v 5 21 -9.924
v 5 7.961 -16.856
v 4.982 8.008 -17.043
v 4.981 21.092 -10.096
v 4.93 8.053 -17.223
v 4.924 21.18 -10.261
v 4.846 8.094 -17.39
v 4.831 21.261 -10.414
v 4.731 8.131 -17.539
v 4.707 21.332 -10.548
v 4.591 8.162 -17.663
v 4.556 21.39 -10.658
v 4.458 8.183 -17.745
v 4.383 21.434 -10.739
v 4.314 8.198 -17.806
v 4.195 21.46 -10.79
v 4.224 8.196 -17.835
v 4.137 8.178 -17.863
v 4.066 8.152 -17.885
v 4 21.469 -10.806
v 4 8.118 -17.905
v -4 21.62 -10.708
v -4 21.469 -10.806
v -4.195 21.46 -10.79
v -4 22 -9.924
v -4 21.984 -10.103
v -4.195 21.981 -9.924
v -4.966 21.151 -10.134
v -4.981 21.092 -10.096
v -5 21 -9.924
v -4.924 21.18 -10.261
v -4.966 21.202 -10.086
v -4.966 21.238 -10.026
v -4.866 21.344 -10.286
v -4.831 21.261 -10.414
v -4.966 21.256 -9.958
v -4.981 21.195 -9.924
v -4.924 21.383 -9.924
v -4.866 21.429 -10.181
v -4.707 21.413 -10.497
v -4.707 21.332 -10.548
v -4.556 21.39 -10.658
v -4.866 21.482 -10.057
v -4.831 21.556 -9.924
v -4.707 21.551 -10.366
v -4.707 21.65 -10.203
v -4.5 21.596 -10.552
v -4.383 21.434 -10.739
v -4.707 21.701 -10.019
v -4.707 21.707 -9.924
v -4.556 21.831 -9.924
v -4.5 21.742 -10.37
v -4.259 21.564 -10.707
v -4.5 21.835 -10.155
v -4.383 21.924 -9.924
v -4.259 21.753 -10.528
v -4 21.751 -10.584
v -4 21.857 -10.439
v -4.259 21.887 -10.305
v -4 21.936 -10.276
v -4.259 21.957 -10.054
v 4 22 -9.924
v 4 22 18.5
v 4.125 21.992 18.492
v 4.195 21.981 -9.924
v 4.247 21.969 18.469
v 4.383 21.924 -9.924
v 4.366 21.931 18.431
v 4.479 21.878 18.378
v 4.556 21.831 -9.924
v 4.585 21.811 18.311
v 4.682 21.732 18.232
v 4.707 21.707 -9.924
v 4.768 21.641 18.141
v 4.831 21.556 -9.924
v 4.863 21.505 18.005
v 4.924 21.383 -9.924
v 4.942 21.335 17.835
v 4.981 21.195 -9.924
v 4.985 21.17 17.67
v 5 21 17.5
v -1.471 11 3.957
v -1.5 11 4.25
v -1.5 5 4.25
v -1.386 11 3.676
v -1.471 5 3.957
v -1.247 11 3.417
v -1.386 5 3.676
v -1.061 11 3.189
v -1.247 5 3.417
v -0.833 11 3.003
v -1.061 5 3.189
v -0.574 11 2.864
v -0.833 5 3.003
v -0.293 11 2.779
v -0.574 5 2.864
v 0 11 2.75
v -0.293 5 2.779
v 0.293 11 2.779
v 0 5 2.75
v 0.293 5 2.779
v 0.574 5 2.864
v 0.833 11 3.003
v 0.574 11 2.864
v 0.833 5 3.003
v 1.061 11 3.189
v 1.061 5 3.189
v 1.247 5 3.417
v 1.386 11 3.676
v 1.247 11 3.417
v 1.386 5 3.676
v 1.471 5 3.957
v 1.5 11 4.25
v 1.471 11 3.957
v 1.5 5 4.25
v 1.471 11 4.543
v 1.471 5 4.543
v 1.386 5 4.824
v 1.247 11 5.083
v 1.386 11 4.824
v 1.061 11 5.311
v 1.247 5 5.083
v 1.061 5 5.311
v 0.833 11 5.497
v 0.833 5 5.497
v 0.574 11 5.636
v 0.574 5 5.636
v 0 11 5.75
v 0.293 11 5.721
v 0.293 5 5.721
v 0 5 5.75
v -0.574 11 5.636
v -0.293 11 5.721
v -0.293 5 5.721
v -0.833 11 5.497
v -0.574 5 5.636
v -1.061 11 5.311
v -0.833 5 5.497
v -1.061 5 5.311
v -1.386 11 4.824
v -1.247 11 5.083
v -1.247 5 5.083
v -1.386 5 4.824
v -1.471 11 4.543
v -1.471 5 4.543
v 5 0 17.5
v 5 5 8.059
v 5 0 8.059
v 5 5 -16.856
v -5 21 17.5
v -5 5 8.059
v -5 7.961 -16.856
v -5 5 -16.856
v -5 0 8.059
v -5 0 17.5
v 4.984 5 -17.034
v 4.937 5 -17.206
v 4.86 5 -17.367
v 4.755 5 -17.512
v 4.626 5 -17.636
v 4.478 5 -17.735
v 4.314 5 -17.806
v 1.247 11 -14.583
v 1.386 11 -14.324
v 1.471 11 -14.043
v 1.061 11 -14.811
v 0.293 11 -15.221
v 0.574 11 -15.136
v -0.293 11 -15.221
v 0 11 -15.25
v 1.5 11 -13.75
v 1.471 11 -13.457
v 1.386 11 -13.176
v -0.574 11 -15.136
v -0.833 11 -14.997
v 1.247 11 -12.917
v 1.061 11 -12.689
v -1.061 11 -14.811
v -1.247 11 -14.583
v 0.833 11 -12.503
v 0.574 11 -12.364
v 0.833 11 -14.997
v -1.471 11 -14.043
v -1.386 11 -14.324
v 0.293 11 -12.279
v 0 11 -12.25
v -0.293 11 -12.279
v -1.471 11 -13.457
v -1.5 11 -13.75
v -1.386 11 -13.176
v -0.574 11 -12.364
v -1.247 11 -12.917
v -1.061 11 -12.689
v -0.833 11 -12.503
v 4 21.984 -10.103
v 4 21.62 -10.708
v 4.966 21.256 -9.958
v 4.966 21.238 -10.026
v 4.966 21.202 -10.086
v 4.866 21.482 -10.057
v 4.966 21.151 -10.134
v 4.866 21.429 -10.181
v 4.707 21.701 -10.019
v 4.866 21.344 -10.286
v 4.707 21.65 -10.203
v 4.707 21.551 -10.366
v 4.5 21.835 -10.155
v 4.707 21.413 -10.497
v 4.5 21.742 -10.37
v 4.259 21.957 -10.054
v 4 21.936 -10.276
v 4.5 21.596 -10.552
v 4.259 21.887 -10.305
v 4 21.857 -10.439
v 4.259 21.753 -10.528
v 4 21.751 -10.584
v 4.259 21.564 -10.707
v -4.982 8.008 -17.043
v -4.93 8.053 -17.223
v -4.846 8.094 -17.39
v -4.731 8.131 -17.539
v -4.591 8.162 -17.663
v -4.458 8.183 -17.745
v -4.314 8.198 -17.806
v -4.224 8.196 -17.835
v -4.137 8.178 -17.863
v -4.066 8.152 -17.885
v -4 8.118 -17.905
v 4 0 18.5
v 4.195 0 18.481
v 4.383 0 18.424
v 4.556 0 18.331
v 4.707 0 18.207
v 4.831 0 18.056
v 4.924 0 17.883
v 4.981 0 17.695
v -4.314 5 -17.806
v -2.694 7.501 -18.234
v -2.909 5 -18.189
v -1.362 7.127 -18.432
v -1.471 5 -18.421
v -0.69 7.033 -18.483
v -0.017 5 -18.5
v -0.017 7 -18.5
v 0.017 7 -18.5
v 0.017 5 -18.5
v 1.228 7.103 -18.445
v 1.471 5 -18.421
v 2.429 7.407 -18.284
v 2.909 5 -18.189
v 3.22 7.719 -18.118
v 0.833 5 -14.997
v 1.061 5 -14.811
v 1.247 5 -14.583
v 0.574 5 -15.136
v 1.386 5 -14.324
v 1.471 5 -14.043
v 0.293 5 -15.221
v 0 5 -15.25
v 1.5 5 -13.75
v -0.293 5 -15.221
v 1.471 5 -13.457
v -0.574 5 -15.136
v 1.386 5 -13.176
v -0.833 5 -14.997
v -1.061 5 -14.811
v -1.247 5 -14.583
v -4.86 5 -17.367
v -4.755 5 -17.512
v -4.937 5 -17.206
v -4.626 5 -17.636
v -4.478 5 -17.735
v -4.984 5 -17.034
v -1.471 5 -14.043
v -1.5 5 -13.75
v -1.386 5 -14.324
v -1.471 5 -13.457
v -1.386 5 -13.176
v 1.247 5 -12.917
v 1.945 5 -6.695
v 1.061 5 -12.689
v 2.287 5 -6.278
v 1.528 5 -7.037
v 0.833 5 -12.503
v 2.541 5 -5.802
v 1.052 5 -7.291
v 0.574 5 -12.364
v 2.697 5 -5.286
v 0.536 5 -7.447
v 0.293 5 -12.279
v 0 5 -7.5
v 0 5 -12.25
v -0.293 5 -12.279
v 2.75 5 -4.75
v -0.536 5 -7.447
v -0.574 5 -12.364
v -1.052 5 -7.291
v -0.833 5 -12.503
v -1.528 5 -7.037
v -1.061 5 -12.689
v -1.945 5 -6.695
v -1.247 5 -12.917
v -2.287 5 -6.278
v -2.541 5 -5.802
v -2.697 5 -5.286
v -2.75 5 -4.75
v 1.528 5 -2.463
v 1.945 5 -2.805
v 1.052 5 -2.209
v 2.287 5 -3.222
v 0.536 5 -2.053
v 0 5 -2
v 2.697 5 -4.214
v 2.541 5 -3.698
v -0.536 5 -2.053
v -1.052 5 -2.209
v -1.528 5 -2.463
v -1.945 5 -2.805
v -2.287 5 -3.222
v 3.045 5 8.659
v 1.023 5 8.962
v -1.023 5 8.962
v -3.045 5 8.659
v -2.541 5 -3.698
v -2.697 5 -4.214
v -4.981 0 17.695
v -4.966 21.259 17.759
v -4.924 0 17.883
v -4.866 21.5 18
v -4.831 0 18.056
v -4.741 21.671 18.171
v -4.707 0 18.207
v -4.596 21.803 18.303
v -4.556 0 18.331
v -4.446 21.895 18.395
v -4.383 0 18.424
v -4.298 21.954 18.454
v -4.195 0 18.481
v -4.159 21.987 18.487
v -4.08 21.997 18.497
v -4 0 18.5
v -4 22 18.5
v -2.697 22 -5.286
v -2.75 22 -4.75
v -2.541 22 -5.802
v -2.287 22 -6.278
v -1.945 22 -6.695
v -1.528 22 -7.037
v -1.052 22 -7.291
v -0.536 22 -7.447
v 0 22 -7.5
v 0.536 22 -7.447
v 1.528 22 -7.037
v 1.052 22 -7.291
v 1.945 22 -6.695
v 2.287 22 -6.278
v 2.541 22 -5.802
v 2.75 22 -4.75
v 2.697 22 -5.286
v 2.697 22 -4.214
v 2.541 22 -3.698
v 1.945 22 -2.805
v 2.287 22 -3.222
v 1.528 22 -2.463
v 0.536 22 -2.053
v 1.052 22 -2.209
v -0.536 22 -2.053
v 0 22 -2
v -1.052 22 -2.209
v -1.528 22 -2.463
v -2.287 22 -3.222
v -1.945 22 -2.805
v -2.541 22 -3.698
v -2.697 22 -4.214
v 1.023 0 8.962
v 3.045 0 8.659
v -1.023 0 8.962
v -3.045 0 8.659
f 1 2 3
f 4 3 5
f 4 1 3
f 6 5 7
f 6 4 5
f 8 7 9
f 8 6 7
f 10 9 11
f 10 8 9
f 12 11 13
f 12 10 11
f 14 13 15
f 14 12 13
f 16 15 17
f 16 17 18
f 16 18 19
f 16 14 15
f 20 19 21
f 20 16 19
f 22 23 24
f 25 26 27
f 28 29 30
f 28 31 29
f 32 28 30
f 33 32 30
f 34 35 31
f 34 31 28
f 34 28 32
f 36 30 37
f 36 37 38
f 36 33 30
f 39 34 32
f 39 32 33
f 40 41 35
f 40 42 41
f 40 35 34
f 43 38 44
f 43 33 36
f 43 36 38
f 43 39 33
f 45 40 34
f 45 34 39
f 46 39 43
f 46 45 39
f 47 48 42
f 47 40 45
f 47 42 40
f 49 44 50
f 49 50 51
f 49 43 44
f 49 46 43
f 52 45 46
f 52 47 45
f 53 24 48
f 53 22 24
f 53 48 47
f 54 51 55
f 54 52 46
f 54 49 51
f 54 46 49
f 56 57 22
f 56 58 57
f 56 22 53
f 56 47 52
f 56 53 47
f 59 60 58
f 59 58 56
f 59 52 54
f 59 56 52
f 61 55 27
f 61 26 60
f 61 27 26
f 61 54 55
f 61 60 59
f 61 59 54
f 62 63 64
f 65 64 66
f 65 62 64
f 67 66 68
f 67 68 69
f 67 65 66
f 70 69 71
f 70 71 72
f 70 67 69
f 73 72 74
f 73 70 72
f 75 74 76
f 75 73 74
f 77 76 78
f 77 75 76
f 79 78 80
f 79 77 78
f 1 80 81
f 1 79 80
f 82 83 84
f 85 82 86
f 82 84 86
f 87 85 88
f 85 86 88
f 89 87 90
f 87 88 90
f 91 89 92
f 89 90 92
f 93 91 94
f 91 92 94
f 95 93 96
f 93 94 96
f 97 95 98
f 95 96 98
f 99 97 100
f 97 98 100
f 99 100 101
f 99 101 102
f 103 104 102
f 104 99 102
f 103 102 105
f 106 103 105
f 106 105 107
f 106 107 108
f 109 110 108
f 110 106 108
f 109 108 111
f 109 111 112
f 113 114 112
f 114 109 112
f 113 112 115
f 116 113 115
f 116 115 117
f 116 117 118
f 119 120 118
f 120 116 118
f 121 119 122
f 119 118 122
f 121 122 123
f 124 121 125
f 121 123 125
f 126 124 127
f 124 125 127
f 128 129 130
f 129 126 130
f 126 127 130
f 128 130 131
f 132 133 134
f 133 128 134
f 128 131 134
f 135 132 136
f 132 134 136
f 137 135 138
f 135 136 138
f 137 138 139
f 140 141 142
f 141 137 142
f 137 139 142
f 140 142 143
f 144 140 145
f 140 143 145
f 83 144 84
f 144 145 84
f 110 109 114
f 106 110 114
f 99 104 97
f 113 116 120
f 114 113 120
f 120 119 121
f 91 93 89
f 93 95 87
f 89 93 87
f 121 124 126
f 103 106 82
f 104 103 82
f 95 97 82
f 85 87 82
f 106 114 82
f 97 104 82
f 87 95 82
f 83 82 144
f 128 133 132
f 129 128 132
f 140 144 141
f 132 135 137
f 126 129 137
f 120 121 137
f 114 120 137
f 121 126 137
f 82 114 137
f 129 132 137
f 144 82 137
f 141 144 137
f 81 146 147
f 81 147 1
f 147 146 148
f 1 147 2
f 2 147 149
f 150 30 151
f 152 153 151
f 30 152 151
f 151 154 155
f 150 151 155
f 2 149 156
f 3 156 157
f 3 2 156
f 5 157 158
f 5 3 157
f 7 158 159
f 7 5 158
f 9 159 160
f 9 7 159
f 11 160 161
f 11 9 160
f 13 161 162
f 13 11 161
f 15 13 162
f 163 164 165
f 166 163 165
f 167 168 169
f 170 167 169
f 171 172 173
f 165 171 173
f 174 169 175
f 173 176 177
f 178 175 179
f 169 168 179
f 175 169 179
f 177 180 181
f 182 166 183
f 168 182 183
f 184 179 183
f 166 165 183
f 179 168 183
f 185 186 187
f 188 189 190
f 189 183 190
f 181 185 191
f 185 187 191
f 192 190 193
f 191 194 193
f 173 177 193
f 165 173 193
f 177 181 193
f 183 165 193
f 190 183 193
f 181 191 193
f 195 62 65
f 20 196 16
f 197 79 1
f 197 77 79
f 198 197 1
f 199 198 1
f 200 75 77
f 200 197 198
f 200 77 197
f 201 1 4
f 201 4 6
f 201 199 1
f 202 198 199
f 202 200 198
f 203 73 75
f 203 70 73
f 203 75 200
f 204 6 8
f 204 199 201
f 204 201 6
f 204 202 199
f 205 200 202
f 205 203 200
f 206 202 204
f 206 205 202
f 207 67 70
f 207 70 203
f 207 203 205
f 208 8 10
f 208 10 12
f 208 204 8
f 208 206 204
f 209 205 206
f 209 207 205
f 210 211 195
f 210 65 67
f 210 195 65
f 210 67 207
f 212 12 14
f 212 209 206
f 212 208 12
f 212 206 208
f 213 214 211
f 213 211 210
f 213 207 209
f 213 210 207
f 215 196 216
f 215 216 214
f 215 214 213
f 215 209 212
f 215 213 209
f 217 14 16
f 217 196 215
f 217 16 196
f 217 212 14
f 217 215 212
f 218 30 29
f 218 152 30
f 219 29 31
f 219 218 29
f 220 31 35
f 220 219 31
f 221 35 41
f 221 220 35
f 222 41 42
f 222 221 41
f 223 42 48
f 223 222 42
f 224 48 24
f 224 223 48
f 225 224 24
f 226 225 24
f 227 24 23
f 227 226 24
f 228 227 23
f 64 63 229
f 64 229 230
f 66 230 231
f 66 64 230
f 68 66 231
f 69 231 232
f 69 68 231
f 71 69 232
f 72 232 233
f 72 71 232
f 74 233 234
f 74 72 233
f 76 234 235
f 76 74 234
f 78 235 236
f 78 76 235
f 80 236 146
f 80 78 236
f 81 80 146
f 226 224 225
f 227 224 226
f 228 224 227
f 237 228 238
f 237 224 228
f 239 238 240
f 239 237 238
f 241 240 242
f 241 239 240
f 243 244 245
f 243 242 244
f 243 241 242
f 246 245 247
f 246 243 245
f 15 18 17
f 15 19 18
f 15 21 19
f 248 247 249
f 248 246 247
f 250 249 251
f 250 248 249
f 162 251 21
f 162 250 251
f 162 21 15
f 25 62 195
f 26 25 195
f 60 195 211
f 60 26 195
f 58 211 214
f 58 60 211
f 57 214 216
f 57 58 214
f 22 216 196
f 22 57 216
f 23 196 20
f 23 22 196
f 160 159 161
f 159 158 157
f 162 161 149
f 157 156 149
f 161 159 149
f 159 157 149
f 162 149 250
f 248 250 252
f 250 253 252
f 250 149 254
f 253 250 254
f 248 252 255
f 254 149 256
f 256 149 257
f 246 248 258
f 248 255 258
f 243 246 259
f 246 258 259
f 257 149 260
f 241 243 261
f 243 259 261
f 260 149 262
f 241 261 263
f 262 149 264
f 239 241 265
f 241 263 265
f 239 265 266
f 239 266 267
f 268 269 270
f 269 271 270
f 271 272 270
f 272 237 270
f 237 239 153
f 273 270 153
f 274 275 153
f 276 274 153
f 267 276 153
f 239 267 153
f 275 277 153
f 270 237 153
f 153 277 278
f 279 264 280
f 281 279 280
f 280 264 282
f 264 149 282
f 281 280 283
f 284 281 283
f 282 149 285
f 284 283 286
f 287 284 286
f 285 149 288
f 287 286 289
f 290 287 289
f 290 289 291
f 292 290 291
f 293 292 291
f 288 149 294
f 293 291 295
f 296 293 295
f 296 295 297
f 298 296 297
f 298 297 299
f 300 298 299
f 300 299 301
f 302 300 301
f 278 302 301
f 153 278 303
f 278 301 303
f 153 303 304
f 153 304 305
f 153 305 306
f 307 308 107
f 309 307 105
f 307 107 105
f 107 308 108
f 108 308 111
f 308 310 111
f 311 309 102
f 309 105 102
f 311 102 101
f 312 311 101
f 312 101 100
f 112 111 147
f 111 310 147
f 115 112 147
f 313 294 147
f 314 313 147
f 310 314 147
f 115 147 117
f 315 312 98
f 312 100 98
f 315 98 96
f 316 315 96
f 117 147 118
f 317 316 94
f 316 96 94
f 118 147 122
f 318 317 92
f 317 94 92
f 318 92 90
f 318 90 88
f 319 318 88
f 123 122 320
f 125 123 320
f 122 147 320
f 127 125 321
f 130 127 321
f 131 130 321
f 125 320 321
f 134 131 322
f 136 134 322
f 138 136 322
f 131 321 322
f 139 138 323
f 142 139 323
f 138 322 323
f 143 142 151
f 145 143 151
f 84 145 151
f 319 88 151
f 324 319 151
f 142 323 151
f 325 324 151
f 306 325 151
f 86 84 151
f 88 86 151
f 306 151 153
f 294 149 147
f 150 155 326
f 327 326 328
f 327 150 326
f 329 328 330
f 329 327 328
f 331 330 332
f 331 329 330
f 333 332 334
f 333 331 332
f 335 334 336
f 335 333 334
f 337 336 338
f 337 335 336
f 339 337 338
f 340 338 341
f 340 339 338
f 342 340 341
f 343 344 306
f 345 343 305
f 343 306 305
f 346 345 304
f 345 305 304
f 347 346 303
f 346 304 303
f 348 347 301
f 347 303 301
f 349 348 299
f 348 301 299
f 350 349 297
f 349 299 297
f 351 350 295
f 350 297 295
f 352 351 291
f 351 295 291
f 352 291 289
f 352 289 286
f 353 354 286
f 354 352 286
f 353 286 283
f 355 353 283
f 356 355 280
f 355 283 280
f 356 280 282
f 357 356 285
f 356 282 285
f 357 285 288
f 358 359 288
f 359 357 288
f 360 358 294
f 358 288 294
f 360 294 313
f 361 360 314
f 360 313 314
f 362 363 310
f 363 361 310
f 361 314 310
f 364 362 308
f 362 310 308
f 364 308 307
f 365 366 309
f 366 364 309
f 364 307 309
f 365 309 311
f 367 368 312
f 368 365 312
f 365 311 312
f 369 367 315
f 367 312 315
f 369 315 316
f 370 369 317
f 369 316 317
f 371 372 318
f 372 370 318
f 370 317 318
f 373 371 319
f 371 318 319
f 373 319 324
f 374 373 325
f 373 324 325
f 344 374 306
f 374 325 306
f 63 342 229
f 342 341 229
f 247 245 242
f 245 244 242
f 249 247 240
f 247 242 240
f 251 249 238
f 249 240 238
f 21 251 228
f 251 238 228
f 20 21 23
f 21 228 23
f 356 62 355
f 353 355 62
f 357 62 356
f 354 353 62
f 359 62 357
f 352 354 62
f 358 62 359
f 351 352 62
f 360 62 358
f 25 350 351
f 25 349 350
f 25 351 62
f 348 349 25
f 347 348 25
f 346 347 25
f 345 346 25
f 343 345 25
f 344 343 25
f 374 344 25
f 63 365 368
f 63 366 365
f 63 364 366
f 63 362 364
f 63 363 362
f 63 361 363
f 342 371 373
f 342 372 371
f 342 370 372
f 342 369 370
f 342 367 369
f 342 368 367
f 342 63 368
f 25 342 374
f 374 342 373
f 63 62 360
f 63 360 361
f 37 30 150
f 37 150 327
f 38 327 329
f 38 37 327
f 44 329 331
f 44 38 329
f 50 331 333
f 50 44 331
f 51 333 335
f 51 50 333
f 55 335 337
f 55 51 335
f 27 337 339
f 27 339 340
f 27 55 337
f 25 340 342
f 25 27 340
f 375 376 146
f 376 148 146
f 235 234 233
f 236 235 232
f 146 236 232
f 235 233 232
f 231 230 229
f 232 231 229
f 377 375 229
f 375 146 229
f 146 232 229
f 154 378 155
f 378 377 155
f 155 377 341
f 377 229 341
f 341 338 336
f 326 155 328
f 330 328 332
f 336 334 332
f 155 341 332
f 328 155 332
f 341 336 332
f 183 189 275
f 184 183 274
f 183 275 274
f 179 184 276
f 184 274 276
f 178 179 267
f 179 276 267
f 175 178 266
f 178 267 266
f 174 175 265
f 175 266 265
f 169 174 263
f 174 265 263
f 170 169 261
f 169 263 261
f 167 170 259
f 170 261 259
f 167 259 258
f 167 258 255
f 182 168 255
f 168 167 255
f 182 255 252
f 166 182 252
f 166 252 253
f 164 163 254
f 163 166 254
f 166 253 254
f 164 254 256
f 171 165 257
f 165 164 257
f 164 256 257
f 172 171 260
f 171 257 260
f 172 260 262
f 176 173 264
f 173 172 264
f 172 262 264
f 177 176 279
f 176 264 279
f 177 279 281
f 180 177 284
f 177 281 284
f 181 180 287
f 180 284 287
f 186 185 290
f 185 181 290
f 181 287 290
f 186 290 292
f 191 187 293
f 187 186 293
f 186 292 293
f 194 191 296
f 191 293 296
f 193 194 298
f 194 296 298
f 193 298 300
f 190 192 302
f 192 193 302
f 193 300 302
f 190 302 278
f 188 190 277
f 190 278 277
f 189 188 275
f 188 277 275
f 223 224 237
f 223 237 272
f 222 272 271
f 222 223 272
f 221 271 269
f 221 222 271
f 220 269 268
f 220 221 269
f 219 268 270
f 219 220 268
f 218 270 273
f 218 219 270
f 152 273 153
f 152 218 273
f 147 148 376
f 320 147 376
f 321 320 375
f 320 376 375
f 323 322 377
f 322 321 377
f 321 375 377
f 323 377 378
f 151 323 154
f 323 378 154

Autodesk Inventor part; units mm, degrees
ref_plane "YZ Plane" through (0, 0, 0) normal (1, 0, 0) x (0, 1, 0)
ref_plane "XZ Plane" through (0, 0, 0) normal (0, 1, 0) x (-1, 0, 0)
ref_plane "XY Plane" through (0, 0, 0) normal (0, 0, 1) x (1, 0, 0)
sketch "Skizze1" plane through (0, 0, 0) normal (0, 1, 0) x (-1, 0, 0)
  line L0 (5, 18.5) -> (-5, 18.5)
  line L1 (-5, 18.5) -> (-5, -18.5)
  line L2 (-5, -18.5) -> (5, -18.5)
  line L3 (5, -18.5) -> (5, 18.5)
  line L4 (5, 18.5) -> (-5, -18.5) construction
  line L5 (-5, 18.5) -> (5, -18.5) construction
  circle A0 centre (0, -4.75) radius 13.75 construction
  arc A1 (-5, -17.5587) -> (5, -17.5587) centre (0, -4.75) ccw
  arc A2 (5, 8.0587) -> (-5, 8.0587) centre (0, -4.75) ccw
  line L6 (0, -18.5) -> (0, 9) construction
  circle A3 centre (0, -13.75) radius 1.5
  circle A4 centre (0, 4.25) radius 1.5
  line L7 (-5, -4.75) -> (5, -4.75) construction
  circle A5 centre (0, -13.75) radius 4 construction
  circle A6 centre (0, 4.25) radius 4 construction
  circle A7 centre (0, -4.75) radius 2.75
  point P0 (0, 0)
  point P1 (0, 0)
  dimension "d2" = 37
  dimension "d3" = 10
  dimension "d4" = 27.5
  dimension "d18" = 3
  dimension "d20" = 18
  dimension "d23" = 8
  dimension "d24" = 8
  dimension "d25" = 5.5
extrude "Extrusion1" add sketch "Skizze1" along normal blind 22 contours L3 A2 L1 L0 | L3 A1 L1 A2 | A3 | A4
sketch "Skizze2" plane through (0, 0, 0) normal (1, 0, 0) x (0, 1, 0)
  line L0 (0, -18.5) -> (0, -7.5) projected
  line L1 (0, 18.5) -> (22, 18.5) projected
  line L2 (22, -7.5) -> (22, -18.5) projected
  line L3 (7, -18.5) -> (22, -10.5244)
  line L4 (22, -18.5) -> (0, -18.5) projected
  line L5 (22, -10.5244) -> (22, -18.5)
  line L6 (22, -18.5) -> (7, -18.5)
  line L7 (0, -7.5) -> (22, -7.5) projected
  line L8 (22, 18.5) -> (22, -2) projected
  line L9 (22, -2) -> (0, -2) projected
  line L10 (0, -2) -> (0, 18.5) projected
  dimension "d14" = 62
  dimension "d15" = 7
extrude "Extrusion5" cut sketch "Skizze2" along normal through all both and the other way through all contours L3 L2 L4
extrude "Extrusion3" cut sketch "Skizze1" along normal blind 5 contours L3 A1 L1 A2 | L3 L2 A1 | A1 L2 L1 | A3 | A4 | A7
extrude "Extrusion6" cut sketch "Skizze1" along normal blind 11 contours A3 | A4
fillet "Rundung1" radius 1 9 edges at (5, 22, 3.9878) (-5, 22, 3.9878) (0, 22, -10.5244) (5, 15.3852, -14.0415) (5, 6.8852, -17.5587) (-5, 6.8852, -17.5587) (-5, 15.3852, -14.0415) (-5, 11, 18.5) (5, 11, 18.5)
properties part number "Schalter_Knauf"
